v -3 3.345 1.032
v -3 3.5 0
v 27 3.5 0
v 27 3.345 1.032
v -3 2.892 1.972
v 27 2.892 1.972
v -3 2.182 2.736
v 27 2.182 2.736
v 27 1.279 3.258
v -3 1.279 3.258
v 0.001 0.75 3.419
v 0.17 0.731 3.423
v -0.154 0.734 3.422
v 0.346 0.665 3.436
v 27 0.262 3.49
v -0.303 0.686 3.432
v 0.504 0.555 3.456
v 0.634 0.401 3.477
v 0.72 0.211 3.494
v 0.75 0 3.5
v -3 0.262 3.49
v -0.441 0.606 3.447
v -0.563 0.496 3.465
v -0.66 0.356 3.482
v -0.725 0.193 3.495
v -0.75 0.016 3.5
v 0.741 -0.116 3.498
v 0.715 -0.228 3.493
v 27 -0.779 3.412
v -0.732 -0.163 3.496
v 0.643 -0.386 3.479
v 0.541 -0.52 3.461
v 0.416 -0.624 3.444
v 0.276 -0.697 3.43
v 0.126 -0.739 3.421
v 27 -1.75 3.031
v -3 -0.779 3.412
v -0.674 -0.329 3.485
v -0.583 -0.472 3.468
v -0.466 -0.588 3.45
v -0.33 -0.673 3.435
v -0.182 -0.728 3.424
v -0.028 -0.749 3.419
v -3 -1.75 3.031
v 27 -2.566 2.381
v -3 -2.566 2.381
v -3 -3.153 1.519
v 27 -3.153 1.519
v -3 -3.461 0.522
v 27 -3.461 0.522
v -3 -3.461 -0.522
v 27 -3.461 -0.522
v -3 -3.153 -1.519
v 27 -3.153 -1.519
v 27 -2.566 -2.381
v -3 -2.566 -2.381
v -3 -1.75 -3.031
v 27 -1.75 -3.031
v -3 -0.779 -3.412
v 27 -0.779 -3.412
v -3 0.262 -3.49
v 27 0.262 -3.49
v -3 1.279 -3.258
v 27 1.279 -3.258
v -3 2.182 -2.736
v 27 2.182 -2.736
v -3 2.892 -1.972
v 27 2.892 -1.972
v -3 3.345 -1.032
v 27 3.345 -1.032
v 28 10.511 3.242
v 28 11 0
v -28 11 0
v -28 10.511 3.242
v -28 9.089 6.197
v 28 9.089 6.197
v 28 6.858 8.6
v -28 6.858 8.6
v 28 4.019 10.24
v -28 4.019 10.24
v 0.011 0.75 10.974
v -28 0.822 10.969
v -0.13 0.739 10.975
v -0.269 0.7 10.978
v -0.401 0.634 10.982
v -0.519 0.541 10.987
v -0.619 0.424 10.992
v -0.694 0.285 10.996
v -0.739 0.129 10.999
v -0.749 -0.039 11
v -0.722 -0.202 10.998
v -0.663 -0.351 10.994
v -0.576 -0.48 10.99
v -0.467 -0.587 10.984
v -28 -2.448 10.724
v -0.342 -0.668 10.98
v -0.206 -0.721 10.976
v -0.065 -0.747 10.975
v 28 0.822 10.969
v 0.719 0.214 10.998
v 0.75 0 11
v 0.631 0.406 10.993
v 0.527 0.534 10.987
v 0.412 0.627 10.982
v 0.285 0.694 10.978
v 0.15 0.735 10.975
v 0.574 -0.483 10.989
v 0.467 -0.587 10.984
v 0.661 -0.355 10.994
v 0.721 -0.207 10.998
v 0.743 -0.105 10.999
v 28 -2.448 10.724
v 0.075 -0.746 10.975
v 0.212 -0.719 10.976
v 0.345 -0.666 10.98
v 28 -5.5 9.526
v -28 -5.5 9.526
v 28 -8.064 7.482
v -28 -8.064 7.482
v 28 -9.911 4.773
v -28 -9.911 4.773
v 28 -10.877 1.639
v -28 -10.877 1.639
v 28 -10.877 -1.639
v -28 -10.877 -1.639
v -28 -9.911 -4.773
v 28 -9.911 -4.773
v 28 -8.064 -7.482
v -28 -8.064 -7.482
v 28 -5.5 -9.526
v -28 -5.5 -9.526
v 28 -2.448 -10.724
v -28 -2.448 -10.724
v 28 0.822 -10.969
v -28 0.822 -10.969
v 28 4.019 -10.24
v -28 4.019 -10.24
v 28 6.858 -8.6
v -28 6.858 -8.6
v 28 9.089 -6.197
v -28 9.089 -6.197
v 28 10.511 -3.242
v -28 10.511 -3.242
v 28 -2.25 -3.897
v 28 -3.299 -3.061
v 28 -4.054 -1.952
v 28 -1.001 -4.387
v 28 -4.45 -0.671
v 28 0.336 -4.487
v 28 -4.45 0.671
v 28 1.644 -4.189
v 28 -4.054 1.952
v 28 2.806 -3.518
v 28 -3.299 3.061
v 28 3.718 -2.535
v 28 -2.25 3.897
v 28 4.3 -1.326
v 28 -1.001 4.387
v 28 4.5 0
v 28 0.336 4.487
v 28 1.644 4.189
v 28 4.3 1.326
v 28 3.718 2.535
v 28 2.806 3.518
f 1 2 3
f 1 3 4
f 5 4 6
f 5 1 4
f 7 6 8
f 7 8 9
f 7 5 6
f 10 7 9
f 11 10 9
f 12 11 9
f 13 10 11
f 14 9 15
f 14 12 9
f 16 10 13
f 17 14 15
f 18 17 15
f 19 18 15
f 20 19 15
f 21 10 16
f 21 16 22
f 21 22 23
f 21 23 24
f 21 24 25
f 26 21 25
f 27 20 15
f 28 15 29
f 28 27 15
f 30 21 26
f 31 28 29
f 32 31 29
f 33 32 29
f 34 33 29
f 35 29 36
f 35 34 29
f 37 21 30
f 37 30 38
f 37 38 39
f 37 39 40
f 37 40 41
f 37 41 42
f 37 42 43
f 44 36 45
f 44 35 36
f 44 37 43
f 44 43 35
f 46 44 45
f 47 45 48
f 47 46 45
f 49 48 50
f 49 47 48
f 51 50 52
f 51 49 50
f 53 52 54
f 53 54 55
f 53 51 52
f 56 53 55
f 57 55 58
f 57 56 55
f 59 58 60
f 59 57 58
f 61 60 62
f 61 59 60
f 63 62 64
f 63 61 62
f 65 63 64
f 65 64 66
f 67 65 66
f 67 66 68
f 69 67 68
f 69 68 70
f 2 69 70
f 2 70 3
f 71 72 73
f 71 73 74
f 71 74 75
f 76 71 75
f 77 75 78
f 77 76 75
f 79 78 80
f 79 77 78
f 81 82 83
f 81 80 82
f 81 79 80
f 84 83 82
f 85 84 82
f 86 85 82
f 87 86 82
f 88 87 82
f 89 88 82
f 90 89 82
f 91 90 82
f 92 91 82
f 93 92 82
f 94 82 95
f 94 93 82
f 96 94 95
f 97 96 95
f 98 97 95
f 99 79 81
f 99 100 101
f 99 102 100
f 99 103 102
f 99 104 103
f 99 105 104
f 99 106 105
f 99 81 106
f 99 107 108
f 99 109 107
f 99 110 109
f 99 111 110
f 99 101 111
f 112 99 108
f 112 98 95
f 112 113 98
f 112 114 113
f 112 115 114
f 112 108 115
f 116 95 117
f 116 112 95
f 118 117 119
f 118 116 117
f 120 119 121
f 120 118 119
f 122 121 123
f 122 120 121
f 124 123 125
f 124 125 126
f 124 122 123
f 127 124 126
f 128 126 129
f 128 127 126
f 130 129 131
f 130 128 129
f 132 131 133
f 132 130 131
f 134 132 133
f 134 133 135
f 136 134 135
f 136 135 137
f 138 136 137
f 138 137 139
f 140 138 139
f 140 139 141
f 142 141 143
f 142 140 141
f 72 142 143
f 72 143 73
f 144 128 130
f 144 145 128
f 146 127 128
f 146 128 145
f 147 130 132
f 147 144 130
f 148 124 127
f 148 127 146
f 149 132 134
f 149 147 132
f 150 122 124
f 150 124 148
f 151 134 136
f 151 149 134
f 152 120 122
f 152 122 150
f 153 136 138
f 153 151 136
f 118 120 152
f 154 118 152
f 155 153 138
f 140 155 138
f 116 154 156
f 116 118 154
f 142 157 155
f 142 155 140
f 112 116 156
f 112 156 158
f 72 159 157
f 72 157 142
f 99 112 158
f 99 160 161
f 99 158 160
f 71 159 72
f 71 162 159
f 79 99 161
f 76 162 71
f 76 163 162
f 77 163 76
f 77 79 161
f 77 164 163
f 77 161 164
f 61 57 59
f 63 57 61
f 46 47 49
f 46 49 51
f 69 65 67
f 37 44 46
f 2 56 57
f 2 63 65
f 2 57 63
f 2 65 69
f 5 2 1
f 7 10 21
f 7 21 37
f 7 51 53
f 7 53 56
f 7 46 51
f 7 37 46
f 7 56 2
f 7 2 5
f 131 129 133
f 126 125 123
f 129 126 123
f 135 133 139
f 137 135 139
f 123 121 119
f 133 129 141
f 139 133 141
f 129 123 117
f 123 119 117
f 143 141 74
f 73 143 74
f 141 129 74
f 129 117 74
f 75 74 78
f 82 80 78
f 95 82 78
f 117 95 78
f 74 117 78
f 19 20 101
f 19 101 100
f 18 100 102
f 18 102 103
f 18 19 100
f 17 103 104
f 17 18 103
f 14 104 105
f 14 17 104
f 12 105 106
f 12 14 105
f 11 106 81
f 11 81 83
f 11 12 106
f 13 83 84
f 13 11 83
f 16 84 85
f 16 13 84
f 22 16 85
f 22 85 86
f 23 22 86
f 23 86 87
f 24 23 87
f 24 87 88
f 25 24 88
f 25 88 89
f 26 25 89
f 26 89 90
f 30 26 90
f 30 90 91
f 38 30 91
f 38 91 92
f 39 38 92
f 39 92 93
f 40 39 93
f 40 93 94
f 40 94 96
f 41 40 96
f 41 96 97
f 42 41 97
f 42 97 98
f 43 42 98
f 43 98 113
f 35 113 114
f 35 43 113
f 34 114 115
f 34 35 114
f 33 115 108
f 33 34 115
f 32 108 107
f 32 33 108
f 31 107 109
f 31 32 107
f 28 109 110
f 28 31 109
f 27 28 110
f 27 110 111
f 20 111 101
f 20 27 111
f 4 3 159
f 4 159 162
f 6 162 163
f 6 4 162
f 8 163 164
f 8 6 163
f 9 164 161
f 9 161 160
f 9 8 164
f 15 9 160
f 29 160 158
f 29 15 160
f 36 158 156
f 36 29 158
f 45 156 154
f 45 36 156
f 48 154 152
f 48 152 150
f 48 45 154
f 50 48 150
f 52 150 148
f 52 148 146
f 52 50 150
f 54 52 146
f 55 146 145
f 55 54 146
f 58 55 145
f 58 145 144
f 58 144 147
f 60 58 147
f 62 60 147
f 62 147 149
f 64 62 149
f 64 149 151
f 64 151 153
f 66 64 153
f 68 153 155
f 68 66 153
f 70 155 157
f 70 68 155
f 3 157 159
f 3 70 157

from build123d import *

# Parameters (mm, degrees)
F1_START = -3
F0_R     = 3.5
F1_DEPTH = 25
F0_R_2   = 11
F2_DEPTH = 28
F3_R     = 0.75
F4_DEPTH = 12.7
F5_SIZE  = 1


with BuildPart() as f1:
    # F0 (on Right) → F1 (new body)
    with BuildSketch(Plane.YZ.offset(F1_START)):
        Circle(F0_R)
    extrude(amount=-F1_DEPTH)

    # F0 (on Right) → F2 (join, symmetric)
    with BuildSketch(Plane.YZ):
        Circle(F0_R_2)
        Circle(F0_R, mode=Mode.SUBTRACT)
    extrude(amount=F2_DEPTH, both=True)

    # F3 (on Top) → F4 (cut)
    with BuildSketch(Plane.XY):
        Circle(F3_R)
    extrude(amount=F4_DEPTH, mode=Mode.SUBTRACT)

    # F5
    f5_edges = [f1.edges().sort_by_distance(p)[0] for p in [
        (28, -3.5, 0),
    ]]
    chamfer(f5_edges, length=F5_SIZE)


solid = f1.part
